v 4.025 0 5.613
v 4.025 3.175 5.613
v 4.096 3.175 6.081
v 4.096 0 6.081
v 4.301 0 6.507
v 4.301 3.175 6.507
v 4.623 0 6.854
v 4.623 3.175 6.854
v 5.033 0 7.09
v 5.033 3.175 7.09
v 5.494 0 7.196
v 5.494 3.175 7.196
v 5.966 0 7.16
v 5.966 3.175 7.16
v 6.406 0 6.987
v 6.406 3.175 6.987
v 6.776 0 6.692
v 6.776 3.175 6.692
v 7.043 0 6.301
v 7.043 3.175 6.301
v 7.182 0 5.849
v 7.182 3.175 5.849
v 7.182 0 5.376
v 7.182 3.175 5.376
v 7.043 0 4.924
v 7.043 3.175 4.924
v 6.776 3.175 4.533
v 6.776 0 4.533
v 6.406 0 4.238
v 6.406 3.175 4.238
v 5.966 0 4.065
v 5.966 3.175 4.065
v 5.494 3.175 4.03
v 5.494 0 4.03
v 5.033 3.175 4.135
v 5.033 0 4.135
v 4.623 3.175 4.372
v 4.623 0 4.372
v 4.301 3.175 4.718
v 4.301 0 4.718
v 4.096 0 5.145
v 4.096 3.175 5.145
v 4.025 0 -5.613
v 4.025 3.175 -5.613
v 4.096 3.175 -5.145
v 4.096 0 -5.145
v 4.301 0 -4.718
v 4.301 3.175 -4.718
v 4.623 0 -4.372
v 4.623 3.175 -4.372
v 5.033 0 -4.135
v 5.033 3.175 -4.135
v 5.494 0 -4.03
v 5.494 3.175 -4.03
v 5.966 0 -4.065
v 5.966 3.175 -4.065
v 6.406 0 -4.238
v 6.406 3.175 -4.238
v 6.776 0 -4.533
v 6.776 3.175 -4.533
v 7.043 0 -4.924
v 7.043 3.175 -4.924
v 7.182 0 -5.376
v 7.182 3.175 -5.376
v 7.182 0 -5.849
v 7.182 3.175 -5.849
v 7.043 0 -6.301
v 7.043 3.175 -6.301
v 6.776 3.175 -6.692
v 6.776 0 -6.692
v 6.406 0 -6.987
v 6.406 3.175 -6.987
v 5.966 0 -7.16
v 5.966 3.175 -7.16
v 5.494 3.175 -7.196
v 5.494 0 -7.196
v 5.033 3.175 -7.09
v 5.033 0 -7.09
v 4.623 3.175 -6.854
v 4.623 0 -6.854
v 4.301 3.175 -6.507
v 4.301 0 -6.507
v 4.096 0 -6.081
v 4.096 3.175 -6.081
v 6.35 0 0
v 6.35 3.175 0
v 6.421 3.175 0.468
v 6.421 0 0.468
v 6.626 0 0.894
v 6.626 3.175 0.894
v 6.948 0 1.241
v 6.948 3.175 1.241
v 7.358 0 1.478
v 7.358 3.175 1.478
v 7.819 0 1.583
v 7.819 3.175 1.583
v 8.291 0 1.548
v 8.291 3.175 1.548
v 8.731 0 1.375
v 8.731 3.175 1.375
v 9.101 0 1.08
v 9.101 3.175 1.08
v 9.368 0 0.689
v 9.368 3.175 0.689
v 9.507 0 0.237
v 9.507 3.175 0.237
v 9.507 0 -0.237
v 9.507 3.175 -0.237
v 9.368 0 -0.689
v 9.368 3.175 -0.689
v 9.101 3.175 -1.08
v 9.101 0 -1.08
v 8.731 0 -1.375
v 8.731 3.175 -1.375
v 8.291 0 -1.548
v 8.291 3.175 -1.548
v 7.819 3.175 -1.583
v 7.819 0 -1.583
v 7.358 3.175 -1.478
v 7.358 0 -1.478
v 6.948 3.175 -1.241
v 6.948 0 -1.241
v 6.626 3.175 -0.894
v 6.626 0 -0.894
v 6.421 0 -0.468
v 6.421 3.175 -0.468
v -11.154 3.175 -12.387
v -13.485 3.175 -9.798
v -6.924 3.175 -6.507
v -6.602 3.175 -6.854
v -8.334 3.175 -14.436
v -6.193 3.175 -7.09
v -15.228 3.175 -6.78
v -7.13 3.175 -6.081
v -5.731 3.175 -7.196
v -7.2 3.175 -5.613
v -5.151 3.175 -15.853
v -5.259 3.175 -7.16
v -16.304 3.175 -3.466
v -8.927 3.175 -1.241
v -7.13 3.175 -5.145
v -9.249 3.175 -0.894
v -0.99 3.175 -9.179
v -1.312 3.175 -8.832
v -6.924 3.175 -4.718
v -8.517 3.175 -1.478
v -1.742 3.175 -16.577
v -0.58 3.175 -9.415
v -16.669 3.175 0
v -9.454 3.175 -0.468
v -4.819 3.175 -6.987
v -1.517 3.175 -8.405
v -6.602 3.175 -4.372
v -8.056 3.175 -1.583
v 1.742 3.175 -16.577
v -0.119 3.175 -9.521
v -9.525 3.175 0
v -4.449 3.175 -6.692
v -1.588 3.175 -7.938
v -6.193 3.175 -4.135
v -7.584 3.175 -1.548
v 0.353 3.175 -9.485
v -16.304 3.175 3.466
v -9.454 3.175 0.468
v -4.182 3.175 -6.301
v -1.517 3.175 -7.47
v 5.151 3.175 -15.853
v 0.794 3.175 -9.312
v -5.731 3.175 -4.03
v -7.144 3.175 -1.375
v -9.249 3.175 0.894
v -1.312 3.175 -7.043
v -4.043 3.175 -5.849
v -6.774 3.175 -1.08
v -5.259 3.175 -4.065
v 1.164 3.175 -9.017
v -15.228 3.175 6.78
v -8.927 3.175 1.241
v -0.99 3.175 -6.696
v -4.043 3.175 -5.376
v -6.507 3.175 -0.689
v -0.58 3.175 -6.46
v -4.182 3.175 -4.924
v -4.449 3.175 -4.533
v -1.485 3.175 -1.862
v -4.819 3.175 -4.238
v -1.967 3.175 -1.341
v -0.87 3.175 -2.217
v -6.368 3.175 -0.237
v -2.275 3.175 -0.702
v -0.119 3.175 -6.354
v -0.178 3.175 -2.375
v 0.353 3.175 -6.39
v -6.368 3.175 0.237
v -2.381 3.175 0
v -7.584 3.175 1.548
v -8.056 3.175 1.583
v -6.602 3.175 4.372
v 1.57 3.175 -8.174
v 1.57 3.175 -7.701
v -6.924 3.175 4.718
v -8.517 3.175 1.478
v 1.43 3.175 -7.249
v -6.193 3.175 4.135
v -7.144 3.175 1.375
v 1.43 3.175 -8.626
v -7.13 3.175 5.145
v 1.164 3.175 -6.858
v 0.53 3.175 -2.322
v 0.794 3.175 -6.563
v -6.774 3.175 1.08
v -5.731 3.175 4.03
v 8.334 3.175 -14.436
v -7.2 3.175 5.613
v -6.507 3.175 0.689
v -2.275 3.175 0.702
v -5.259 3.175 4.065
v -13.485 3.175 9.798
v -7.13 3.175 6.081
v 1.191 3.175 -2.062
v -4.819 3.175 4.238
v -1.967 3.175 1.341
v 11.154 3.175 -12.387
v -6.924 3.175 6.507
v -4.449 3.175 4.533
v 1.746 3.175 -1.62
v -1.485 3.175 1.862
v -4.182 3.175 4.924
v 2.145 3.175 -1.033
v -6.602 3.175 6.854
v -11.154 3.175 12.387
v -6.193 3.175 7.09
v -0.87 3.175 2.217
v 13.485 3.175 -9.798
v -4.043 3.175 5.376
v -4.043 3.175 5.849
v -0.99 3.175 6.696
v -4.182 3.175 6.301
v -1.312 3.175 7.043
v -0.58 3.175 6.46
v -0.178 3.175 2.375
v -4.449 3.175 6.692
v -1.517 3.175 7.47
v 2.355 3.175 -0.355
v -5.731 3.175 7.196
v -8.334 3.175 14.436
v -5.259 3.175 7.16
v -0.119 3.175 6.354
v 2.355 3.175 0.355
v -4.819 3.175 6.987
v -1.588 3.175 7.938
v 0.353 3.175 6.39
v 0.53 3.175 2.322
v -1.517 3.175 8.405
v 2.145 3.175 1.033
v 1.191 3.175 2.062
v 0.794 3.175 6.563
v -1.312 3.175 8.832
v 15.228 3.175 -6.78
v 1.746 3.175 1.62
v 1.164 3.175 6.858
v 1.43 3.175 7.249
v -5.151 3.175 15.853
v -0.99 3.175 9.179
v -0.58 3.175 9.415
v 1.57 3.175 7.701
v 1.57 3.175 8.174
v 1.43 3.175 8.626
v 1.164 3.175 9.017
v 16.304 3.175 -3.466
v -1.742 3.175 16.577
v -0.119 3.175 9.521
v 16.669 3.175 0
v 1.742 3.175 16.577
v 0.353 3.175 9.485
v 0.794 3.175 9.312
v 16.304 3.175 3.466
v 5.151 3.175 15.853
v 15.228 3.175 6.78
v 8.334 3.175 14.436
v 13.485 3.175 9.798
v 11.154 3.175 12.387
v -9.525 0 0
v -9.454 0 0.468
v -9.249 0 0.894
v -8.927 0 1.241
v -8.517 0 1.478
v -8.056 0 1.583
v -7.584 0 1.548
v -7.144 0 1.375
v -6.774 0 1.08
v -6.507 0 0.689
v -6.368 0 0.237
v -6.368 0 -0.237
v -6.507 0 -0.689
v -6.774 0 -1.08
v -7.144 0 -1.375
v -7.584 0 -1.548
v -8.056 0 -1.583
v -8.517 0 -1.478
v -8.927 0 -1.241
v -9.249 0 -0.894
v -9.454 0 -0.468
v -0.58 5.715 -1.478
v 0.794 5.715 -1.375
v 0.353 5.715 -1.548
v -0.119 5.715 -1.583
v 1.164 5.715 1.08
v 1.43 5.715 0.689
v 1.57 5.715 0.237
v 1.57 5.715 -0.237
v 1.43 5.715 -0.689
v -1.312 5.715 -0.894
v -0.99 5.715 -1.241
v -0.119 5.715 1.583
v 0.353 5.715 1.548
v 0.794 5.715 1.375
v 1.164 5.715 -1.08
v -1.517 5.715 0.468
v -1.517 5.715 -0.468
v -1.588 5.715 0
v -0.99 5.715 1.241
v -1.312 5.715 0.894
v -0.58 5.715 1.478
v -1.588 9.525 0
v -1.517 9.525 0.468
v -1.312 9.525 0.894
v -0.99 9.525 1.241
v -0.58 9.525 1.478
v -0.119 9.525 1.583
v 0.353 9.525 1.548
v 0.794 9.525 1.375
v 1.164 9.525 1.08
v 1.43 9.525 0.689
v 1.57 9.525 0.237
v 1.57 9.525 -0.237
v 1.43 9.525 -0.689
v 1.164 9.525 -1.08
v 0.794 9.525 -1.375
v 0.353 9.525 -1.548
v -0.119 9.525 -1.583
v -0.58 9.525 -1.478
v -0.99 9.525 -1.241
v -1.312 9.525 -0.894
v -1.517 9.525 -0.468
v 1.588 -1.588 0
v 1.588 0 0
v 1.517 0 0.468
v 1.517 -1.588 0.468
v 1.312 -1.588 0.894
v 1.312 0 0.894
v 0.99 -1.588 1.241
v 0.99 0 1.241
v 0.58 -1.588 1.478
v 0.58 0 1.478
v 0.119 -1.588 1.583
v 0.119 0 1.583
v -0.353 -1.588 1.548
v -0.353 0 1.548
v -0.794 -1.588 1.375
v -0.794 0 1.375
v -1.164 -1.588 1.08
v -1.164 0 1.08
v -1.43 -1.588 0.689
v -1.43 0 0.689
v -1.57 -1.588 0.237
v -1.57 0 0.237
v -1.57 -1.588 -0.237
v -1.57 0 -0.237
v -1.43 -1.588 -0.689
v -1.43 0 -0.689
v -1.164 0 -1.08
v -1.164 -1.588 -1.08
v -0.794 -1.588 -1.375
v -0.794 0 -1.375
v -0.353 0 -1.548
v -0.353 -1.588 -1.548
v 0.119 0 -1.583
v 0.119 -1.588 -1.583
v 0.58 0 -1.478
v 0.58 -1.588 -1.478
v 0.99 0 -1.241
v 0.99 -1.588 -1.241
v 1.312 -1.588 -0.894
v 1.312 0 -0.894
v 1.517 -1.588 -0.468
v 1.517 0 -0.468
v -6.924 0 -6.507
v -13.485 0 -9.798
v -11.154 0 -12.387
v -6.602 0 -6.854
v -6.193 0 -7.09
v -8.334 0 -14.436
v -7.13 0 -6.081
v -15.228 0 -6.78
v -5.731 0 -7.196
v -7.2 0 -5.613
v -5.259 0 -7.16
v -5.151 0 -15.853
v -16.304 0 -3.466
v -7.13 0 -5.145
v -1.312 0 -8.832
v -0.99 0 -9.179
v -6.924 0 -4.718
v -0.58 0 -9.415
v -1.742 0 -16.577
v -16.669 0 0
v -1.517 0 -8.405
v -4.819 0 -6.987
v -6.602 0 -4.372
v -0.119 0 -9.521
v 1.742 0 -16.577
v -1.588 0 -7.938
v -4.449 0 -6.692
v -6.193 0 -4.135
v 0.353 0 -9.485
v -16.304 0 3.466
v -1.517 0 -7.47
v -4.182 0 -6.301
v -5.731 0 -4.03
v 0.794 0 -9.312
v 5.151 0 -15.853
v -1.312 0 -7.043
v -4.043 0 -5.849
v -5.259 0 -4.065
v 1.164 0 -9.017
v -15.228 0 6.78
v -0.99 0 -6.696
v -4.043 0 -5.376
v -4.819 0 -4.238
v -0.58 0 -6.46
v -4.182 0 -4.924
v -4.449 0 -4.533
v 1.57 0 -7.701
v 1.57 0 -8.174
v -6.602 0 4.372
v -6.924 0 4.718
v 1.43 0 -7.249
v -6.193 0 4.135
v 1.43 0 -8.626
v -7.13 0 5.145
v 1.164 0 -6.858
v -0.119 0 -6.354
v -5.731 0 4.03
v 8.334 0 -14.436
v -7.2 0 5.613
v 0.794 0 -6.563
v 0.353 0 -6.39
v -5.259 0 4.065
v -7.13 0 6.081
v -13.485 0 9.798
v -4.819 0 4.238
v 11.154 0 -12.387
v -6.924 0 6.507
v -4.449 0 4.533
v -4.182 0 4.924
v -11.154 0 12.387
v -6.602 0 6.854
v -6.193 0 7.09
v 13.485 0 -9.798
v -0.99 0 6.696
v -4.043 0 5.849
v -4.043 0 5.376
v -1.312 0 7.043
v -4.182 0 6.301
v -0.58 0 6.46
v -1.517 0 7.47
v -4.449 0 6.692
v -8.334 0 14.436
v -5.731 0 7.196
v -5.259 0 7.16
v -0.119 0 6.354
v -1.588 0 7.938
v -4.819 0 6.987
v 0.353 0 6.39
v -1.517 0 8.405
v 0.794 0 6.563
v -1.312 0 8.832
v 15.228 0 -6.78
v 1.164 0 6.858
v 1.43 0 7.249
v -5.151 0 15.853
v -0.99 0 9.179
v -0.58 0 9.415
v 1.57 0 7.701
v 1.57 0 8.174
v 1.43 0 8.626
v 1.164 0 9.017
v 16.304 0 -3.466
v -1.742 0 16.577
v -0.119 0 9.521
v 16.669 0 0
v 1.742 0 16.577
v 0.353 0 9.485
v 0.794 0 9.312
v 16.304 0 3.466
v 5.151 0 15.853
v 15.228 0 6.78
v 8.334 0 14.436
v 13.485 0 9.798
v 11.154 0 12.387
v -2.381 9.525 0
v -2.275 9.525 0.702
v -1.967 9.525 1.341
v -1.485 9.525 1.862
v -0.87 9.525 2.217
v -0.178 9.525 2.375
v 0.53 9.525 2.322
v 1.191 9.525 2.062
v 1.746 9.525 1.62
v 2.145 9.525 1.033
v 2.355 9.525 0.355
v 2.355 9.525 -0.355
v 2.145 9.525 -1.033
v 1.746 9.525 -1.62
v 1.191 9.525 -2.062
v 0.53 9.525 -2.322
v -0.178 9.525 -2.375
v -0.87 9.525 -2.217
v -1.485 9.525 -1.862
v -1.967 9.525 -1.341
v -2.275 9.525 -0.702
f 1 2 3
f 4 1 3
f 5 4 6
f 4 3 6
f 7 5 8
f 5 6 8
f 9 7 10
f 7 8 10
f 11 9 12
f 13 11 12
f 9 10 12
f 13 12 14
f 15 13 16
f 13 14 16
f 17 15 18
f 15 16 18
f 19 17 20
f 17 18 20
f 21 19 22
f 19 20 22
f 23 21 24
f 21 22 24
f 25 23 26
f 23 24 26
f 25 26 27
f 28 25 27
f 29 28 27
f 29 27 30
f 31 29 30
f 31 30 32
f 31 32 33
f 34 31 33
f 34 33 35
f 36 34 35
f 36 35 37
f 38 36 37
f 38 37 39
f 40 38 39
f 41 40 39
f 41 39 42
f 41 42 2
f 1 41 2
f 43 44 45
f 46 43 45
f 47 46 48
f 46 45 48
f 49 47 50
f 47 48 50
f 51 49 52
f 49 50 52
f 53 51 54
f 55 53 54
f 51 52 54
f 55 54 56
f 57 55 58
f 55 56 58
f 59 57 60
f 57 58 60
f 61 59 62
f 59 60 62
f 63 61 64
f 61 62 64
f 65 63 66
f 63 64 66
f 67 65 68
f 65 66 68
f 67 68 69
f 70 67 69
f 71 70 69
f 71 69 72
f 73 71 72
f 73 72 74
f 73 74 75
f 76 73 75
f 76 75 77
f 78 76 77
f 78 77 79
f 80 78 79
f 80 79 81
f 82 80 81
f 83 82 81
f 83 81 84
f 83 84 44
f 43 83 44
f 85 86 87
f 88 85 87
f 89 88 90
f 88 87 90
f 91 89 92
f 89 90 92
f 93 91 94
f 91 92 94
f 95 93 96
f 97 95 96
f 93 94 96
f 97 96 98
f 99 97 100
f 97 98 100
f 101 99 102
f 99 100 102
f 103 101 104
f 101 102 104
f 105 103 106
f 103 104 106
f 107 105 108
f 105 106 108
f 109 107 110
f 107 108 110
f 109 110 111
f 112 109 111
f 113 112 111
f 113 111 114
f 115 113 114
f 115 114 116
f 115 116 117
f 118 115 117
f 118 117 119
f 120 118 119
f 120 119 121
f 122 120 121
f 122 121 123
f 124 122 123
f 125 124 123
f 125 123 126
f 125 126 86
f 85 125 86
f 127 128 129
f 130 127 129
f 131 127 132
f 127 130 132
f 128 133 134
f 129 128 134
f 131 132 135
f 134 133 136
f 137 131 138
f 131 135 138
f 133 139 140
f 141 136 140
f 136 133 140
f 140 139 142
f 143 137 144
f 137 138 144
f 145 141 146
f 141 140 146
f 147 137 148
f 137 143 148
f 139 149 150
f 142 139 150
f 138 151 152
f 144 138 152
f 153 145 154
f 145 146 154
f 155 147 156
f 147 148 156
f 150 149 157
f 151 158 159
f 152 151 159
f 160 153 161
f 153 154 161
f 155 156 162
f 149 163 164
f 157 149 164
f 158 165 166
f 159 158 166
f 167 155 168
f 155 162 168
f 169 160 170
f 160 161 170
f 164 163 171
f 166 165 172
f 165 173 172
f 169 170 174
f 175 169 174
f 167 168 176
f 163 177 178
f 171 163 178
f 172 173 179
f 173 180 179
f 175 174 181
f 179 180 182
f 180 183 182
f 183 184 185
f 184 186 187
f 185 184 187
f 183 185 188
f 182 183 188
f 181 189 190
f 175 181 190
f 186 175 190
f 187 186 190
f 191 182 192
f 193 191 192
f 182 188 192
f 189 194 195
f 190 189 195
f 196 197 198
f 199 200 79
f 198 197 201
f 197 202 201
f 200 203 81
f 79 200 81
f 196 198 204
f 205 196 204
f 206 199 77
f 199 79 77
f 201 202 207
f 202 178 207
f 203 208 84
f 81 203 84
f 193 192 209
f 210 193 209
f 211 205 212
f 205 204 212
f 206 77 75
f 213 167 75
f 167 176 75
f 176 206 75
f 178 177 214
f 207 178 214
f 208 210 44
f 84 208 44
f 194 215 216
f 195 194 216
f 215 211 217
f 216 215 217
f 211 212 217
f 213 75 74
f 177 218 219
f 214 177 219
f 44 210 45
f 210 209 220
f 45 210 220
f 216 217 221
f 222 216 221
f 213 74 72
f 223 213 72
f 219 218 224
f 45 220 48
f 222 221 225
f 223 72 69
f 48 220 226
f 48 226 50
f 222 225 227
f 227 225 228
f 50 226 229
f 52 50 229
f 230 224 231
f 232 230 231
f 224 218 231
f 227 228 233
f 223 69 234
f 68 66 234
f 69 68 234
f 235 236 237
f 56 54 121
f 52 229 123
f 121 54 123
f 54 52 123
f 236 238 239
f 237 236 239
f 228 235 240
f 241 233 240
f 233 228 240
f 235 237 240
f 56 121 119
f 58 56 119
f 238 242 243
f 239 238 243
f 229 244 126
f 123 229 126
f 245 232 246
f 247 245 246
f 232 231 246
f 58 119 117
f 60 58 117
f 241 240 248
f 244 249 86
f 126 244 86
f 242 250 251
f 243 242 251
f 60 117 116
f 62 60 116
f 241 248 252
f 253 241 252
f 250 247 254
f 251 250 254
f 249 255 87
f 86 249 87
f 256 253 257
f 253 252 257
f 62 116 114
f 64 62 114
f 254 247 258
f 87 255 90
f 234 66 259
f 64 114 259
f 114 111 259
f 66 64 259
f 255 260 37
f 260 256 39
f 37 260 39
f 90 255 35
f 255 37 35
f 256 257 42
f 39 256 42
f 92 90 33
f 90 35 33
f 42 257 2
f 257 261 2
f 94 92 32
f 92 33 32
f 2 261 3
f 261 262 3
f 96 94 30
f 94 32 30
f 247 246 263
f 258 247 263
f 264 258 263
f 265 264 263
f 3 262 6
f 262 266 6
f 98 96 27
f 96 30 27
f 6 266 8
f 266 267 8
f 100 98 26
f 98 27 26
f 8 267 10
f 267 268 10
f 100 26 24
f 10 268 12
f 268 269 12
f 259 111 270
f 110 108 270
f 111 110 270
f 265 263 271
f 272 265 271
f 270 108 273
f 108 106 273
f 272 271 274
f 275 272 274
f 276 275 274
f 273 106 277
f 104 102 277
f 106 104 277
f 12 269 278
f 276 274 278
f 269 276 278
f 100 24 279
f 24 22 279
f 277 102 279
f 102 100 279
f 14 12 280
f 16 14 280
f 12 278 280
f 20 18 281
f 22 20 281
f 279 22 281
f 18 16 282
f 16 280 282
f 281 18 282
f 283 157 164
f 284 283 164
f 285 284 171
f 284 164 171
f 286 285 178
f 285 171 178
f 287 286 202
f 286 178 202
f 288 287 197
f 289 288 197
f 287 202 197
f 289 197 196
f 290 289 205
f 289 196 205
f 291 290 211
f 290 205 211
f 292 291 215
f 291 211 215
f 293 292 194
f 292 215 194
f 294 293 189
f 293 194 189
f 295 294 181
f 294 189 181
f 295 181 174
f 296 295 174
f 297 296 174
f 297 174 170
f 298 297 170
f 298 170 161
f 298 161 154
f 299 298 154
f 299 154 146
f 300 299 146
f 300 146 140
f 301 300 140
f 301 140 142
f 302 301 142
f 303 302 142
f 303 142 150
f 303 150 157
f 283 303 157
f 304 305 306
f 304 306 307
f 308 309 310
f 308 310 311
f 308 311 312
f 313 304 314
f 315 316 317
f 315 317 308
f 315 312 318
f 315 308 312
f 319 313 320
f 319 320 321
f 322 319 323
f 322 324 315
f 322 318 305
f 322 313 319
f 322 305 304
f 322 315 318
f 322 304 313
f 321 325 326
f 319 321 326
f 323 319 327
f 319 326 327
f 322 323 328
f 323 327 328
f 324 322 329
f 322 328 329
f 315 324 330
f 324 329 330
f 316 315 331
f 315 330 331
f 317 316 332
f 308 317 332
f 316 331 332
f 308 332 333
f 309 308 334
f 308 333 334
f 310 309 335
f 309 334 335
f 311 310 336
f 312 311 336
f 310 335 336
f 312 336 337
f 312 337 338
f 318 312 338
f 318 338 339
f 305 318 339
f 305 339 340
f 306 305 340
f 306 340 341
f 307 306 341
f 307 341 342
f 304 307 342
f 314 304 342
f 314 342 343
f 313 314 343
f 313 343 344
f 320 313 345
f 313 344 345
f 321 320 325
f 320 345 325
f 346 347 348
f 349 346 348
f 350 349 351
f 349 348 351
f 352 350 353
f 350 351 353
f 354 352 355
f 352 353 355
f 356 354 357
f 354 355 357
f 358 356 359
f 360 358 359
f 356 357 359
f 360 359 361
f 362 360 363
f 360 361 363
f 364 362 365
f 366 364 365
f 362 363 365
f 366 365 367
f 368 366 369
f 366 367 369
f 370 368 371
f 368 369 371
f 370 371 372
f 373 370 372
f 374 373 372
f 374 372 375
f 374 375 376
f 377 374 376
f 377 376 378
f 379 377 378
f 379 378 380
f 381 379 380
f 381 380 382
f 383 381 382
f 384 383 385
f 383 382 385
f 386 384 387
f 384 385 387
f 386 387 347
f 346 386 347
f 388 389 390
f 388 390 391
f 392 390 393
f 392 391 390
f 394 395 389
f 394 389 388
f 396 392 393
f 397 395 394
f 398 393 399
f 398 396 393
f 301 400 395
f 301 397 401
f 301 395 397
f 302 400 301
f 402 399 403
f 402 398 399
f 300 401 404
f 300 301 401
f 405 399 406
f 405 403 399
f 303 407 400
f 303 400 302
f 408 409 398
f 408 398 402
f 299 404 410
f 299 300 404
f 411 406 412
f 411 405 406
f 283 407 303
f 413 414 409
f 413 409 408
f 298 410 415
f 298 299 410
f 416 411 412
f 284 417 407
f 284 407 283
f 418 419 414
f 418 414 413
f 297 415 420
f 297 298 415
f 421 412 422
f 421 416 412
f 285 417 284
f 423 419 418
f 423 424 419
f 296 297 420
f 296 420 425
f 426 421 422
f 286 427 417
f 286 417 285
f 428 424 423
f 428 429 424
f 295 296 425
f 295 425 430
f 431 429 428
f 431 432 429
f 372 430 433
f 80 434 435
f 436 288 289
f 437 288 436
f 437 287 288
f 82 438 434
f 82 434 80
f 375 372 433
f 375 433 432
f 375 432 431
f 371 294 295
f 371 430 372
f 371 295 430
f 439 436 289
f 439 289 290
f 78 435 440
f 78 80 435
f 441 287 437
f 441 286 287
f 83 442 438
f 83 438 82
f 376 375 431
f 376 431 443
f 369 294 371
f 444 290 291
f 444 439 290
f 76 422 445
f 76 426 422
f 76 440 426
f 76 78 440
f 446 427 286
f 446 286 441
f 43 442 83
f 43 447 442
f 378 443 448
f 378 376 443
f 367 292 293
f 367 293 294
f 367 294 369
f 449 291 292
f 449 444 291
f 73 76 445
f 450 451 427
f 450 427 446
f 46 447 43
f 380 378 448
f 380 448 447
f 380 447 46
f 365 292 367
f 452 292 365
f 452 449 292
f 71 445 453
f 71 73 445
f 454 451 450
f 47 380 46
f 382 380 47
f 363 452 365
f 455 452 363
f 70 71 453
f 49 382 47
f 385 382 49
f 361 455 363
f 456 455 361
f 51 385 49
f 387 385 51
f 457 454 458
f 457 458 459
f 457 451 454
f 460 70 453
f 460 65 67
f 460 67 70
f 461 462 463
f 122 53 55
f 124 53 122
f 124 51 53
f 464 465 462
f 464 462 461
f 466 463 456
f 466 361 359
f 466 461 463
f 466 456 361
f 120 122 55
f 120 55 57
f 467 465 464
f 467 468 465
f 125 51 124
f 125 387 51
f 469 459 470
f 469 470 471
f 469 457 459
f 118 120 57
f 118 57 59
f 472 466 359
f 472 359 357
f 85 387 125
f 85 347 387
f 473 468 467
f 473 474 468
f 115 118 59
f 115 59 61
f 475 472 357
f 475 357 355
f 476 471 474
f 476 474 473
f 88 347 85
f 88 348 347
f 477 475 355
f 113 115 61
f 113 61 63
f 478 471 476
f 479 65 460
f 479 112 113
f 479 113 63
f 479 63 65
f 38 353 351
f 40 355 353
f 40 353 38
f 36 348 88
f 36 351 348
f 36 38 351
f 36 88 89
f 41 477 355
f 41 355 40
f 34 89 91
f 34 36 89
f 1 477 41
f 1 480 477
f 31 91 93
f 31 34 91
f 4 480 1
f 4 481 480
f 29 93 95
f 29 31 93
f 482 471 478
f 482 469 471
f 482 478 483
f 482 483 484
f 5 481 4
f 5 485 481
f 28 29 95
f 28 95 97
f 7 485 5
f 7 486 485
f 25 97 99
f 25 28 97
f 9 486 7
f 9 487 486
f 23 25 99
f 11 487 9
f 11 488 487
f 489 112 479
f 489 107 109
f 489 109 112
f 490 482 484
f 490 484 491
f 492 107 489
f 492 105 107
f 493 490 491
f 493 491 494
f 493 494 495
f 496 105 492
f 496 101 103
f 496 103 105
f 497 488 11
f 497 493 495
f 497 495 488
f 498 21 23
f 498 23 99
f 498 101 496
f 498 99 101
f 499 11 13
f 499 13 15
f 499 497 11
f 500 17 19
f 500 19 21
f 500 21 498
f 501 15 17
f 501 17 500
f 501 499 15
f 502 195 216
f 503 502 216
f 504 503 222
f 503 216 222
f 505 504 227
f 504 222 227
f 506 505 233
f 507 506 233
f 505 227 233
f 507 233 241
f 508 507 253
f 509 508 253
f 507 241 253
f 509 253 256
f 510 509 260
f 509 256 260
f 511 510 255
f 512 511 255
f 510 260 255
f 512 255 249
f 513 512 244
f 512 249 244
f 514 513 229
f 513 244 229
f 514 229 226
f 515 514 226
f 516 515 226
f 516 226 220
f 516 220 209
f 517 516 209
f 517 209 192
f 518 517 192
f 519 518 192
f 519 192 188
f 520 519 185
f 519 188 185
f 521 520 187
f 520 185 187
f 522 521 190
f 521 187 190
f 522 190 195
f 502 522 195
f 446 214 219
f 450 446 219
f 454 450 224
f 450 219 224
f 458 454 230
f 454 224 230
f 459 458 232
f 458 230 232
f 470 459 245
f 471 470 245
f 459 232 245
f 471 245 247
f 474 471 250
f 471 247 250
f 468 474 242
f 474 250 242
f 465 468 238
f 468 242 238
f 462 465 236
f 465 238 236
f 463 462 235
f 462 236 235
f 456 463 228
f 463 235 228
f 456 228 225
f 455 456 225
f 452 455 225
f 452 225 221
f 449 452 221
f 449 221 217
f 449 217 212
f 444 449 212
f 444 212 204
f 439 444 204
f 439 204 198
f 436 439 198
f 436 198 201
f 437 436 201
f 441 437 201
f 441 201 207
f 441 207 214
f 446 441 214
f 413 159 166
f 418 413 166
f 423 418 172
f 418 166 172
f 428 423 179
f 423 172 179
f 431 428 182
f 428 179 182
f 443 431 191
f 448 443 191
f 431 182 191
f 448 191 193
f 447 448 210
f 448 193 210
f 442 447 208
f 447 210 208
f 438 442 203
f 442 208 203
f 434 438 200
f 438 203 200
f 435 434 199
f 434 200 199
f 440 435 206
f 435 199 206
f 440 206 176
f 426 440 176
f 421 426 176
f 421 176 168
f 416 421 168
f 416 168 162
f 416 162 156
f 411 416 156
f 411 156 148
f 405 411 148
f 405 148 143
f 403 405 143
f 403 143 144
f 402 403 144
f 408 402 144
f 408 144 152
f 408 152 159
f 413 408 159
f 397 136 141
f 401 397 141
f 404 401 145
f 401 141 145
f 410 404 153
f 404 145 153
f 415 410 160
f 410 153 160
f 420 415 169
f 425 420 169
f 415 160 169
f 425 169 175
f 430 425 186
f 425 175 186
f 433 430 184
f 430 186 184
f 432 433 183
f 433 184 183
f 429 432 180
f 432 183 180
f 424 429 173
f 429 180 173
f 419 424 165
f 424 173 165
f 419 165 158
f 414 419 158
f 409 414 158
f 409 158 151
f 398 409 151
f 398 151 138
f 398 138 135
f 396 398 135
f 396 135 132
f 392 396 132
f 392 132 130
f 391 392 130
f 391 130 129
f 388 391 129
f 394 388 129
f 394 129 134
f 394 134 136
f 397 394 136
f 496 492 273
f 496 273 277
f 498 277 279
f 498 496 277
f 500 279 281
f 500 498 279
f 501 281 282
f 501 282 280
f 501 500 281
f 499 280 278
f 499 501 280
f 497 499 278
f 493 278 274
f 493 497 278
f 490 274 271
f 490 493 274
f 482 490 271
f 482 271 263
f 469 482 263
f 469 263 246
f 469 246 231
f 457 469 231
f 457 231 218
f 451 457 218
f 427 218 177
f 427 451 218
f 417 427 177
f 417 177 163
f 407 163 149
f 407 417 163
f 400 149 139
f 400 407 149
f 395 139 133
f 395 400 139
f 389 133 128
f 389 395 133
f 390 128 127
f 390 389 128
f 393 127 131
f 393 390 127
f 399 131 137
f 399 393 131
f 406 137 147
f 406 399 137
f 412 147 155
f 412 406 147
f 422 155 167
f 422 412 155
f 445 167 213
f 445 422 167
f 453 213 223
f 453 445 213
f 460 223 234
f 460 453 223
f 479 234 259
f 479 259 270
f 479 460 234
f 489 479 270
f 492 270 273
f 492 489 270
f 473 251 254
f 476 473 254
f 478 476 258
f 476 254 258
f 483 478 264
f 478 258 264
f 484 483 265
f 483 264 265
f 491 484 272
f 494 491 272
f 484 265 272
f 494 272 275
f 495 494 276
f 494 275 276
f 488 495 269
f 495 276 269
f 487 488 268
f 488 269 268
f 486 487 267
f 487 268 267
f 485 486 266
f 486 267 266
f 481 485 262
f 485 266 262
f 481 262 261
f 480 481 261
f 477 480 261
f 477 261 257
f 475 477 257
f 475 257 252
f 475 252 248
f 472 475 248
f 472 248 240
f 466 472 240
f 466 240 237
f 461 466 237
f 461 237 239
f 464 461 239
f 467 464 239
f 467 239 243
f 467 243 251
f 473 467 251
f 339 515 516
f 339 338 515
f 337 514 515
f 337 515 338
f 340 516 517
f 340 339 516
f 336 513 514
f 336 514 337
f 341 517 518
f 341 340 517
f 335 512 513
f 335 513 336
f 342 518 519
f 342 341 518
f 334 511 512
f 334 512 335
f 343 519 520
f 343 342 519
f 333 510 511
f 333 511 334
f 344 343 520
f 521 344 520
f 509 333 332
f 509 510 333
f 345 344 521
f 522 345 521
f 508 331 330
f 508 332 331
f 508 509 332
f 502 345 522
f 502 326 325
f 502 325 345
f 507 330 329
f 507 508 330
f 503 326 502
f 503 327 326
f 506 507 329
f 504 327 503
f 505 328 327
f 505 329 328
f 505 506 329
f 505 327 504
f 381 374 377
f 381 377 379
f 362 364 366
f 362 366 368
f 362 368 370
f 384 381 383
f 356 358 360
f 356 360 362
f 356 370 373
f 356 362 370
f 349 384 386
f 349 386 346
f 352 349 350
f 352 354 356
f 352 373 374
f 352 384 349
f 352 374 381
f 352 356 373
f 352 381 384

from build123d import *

# Parameters (mm, degrees)
F0_R     = 16.66875
F1_DEPTH = 3.175
F2_R     = 2.38125
F3_DEPTH = 6.35
F4_R     = 1.5875
F5_DEPTH = 25.4
F6_R     = 1.5875
F7_DEPTH = 1.5875
F8_R     = 1.5875
F9_DEPTH = 3.81


with BuildPart() as f1:
    # F0 (on Front) → F1 (new body)
    with BuildSketch(Plane.XZ):
        Circle(F0_R)
    extrude(amount=-F1_DEPTH)

    # F2 (on face) → F3 (join)
    with BuildSketch(Plane(origin=(0, 3.175, 0), x_dir=(-1, 0, 0), z_dir=(0, 1, 0))):
        Circle(F2_R)
    extrude(amount=F3_DEPTH)

    # F4 (on face) → F5 (cut)
    with BuildSketch(Plane(origin=(0, 9.525, 0), x_dir=(-1, 0, 0), z_dir=(0, 1, 0))):
        with Locations((7.9375, 0)):
            Circle(F4_R)
        with Locations((5.61266, 5.61266)):
            Circle(F4_R)
        with Locations((0, 7.9375)):
            Circle(F4_R)
        with Locations((-5.61266, 5.61266)):
            Circle(F4_R)
        with Locations((-7.9375, 0)):
            Circle(F4_R)
        with Locations((-5.61266, -5.61266)):
            Circle(F4_R)
        with Locations((0, -7.9375)):
            Circle(F4_R)
        with Locations((5.61266, -5.61266)):
            Circle(F4_R)
    extrude(amount=-F5_DEPTH, mode=Mode.SUBTRACT)

    # F6 (on face) → F7 (join)
    with BuildSketch(Plane.XZ):
        Circle(F6_R)
    extrude(amount=F7_DEPTH)

    # F8 (on face) → F9 (cut)
    with BuildSketch(Plane(origin=(0, 9.525, 0), x_dir=(-1, 0, 0), z_dir=(0, 1, 0))):
        Circle(F8_R)
    extrude(amount=-F9_DEPTH, mode=Mode.SUBTRACT)


solid = f1.part
